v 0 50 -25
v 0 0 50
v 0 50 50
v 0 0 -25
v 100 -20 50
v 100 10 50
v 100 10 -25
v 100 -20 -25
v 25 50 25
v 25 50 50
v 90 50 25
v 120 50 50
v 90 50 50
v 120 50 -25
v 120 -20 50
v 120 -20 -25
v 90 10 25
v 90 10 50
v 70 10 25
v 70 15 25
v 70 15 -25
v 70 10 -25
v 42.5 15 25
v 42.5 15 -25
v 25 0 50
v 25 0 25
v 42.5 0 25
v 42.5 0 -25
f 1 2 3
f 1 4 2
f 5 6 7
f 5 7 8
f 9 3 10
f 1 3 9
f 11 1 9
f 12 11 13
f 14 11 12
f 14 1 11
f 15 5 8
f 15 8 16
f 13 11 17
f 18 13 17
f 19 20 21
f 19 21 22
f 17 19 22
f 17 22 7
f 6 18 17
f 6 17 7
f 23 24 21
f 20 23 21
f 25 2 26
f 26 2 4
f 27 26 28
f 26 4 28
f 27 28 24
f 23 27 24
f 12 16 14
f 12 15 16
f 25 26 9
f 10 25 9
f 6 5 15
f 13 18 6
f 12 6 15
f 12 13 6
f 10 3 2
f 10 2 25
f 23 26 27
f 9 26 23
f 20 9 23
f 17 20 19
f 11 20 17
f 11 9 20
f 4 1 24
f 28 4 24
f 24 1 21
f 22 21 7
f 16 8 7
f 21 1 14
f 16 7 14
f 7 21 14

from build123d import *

# Parameters (mm, degrees)
F0_W     = 25
F0_H     = 50
F1_DEPTH = 25
F2_W     = 25
F2_H     = 50
F3_DEPTH = 25


with BuildPart() as f1:
    # F0 (on Top) → F1 (new body, symmetric)
    with BuildSketch(Plane.XY):
        with Locations((12.5, 25)):
            Rectangle(F0_W, F0_H)
        Polygon((25, 50), (25, 0), (42.5, 0), (42.5, 15), (70, 15), (70, 10), (100, 10), (100, -20), (120, -20), (120, 50), align=None)
    extrude(amount=F1_DEPTH, both=True)

    # F2 (on face) → F3 (join)
    with BuildSketch(Plane.XY.offset(25)):
        with Locations((12.5, 25)):
            Rectangle(F2_W, F2_H)
        Polygon((100, -20), (120, -20), (120, 50), (90, 50), (90, 10), (100, 10), align=None)
    extrude(amount=F3_DEPTH)


solid = f1.part
